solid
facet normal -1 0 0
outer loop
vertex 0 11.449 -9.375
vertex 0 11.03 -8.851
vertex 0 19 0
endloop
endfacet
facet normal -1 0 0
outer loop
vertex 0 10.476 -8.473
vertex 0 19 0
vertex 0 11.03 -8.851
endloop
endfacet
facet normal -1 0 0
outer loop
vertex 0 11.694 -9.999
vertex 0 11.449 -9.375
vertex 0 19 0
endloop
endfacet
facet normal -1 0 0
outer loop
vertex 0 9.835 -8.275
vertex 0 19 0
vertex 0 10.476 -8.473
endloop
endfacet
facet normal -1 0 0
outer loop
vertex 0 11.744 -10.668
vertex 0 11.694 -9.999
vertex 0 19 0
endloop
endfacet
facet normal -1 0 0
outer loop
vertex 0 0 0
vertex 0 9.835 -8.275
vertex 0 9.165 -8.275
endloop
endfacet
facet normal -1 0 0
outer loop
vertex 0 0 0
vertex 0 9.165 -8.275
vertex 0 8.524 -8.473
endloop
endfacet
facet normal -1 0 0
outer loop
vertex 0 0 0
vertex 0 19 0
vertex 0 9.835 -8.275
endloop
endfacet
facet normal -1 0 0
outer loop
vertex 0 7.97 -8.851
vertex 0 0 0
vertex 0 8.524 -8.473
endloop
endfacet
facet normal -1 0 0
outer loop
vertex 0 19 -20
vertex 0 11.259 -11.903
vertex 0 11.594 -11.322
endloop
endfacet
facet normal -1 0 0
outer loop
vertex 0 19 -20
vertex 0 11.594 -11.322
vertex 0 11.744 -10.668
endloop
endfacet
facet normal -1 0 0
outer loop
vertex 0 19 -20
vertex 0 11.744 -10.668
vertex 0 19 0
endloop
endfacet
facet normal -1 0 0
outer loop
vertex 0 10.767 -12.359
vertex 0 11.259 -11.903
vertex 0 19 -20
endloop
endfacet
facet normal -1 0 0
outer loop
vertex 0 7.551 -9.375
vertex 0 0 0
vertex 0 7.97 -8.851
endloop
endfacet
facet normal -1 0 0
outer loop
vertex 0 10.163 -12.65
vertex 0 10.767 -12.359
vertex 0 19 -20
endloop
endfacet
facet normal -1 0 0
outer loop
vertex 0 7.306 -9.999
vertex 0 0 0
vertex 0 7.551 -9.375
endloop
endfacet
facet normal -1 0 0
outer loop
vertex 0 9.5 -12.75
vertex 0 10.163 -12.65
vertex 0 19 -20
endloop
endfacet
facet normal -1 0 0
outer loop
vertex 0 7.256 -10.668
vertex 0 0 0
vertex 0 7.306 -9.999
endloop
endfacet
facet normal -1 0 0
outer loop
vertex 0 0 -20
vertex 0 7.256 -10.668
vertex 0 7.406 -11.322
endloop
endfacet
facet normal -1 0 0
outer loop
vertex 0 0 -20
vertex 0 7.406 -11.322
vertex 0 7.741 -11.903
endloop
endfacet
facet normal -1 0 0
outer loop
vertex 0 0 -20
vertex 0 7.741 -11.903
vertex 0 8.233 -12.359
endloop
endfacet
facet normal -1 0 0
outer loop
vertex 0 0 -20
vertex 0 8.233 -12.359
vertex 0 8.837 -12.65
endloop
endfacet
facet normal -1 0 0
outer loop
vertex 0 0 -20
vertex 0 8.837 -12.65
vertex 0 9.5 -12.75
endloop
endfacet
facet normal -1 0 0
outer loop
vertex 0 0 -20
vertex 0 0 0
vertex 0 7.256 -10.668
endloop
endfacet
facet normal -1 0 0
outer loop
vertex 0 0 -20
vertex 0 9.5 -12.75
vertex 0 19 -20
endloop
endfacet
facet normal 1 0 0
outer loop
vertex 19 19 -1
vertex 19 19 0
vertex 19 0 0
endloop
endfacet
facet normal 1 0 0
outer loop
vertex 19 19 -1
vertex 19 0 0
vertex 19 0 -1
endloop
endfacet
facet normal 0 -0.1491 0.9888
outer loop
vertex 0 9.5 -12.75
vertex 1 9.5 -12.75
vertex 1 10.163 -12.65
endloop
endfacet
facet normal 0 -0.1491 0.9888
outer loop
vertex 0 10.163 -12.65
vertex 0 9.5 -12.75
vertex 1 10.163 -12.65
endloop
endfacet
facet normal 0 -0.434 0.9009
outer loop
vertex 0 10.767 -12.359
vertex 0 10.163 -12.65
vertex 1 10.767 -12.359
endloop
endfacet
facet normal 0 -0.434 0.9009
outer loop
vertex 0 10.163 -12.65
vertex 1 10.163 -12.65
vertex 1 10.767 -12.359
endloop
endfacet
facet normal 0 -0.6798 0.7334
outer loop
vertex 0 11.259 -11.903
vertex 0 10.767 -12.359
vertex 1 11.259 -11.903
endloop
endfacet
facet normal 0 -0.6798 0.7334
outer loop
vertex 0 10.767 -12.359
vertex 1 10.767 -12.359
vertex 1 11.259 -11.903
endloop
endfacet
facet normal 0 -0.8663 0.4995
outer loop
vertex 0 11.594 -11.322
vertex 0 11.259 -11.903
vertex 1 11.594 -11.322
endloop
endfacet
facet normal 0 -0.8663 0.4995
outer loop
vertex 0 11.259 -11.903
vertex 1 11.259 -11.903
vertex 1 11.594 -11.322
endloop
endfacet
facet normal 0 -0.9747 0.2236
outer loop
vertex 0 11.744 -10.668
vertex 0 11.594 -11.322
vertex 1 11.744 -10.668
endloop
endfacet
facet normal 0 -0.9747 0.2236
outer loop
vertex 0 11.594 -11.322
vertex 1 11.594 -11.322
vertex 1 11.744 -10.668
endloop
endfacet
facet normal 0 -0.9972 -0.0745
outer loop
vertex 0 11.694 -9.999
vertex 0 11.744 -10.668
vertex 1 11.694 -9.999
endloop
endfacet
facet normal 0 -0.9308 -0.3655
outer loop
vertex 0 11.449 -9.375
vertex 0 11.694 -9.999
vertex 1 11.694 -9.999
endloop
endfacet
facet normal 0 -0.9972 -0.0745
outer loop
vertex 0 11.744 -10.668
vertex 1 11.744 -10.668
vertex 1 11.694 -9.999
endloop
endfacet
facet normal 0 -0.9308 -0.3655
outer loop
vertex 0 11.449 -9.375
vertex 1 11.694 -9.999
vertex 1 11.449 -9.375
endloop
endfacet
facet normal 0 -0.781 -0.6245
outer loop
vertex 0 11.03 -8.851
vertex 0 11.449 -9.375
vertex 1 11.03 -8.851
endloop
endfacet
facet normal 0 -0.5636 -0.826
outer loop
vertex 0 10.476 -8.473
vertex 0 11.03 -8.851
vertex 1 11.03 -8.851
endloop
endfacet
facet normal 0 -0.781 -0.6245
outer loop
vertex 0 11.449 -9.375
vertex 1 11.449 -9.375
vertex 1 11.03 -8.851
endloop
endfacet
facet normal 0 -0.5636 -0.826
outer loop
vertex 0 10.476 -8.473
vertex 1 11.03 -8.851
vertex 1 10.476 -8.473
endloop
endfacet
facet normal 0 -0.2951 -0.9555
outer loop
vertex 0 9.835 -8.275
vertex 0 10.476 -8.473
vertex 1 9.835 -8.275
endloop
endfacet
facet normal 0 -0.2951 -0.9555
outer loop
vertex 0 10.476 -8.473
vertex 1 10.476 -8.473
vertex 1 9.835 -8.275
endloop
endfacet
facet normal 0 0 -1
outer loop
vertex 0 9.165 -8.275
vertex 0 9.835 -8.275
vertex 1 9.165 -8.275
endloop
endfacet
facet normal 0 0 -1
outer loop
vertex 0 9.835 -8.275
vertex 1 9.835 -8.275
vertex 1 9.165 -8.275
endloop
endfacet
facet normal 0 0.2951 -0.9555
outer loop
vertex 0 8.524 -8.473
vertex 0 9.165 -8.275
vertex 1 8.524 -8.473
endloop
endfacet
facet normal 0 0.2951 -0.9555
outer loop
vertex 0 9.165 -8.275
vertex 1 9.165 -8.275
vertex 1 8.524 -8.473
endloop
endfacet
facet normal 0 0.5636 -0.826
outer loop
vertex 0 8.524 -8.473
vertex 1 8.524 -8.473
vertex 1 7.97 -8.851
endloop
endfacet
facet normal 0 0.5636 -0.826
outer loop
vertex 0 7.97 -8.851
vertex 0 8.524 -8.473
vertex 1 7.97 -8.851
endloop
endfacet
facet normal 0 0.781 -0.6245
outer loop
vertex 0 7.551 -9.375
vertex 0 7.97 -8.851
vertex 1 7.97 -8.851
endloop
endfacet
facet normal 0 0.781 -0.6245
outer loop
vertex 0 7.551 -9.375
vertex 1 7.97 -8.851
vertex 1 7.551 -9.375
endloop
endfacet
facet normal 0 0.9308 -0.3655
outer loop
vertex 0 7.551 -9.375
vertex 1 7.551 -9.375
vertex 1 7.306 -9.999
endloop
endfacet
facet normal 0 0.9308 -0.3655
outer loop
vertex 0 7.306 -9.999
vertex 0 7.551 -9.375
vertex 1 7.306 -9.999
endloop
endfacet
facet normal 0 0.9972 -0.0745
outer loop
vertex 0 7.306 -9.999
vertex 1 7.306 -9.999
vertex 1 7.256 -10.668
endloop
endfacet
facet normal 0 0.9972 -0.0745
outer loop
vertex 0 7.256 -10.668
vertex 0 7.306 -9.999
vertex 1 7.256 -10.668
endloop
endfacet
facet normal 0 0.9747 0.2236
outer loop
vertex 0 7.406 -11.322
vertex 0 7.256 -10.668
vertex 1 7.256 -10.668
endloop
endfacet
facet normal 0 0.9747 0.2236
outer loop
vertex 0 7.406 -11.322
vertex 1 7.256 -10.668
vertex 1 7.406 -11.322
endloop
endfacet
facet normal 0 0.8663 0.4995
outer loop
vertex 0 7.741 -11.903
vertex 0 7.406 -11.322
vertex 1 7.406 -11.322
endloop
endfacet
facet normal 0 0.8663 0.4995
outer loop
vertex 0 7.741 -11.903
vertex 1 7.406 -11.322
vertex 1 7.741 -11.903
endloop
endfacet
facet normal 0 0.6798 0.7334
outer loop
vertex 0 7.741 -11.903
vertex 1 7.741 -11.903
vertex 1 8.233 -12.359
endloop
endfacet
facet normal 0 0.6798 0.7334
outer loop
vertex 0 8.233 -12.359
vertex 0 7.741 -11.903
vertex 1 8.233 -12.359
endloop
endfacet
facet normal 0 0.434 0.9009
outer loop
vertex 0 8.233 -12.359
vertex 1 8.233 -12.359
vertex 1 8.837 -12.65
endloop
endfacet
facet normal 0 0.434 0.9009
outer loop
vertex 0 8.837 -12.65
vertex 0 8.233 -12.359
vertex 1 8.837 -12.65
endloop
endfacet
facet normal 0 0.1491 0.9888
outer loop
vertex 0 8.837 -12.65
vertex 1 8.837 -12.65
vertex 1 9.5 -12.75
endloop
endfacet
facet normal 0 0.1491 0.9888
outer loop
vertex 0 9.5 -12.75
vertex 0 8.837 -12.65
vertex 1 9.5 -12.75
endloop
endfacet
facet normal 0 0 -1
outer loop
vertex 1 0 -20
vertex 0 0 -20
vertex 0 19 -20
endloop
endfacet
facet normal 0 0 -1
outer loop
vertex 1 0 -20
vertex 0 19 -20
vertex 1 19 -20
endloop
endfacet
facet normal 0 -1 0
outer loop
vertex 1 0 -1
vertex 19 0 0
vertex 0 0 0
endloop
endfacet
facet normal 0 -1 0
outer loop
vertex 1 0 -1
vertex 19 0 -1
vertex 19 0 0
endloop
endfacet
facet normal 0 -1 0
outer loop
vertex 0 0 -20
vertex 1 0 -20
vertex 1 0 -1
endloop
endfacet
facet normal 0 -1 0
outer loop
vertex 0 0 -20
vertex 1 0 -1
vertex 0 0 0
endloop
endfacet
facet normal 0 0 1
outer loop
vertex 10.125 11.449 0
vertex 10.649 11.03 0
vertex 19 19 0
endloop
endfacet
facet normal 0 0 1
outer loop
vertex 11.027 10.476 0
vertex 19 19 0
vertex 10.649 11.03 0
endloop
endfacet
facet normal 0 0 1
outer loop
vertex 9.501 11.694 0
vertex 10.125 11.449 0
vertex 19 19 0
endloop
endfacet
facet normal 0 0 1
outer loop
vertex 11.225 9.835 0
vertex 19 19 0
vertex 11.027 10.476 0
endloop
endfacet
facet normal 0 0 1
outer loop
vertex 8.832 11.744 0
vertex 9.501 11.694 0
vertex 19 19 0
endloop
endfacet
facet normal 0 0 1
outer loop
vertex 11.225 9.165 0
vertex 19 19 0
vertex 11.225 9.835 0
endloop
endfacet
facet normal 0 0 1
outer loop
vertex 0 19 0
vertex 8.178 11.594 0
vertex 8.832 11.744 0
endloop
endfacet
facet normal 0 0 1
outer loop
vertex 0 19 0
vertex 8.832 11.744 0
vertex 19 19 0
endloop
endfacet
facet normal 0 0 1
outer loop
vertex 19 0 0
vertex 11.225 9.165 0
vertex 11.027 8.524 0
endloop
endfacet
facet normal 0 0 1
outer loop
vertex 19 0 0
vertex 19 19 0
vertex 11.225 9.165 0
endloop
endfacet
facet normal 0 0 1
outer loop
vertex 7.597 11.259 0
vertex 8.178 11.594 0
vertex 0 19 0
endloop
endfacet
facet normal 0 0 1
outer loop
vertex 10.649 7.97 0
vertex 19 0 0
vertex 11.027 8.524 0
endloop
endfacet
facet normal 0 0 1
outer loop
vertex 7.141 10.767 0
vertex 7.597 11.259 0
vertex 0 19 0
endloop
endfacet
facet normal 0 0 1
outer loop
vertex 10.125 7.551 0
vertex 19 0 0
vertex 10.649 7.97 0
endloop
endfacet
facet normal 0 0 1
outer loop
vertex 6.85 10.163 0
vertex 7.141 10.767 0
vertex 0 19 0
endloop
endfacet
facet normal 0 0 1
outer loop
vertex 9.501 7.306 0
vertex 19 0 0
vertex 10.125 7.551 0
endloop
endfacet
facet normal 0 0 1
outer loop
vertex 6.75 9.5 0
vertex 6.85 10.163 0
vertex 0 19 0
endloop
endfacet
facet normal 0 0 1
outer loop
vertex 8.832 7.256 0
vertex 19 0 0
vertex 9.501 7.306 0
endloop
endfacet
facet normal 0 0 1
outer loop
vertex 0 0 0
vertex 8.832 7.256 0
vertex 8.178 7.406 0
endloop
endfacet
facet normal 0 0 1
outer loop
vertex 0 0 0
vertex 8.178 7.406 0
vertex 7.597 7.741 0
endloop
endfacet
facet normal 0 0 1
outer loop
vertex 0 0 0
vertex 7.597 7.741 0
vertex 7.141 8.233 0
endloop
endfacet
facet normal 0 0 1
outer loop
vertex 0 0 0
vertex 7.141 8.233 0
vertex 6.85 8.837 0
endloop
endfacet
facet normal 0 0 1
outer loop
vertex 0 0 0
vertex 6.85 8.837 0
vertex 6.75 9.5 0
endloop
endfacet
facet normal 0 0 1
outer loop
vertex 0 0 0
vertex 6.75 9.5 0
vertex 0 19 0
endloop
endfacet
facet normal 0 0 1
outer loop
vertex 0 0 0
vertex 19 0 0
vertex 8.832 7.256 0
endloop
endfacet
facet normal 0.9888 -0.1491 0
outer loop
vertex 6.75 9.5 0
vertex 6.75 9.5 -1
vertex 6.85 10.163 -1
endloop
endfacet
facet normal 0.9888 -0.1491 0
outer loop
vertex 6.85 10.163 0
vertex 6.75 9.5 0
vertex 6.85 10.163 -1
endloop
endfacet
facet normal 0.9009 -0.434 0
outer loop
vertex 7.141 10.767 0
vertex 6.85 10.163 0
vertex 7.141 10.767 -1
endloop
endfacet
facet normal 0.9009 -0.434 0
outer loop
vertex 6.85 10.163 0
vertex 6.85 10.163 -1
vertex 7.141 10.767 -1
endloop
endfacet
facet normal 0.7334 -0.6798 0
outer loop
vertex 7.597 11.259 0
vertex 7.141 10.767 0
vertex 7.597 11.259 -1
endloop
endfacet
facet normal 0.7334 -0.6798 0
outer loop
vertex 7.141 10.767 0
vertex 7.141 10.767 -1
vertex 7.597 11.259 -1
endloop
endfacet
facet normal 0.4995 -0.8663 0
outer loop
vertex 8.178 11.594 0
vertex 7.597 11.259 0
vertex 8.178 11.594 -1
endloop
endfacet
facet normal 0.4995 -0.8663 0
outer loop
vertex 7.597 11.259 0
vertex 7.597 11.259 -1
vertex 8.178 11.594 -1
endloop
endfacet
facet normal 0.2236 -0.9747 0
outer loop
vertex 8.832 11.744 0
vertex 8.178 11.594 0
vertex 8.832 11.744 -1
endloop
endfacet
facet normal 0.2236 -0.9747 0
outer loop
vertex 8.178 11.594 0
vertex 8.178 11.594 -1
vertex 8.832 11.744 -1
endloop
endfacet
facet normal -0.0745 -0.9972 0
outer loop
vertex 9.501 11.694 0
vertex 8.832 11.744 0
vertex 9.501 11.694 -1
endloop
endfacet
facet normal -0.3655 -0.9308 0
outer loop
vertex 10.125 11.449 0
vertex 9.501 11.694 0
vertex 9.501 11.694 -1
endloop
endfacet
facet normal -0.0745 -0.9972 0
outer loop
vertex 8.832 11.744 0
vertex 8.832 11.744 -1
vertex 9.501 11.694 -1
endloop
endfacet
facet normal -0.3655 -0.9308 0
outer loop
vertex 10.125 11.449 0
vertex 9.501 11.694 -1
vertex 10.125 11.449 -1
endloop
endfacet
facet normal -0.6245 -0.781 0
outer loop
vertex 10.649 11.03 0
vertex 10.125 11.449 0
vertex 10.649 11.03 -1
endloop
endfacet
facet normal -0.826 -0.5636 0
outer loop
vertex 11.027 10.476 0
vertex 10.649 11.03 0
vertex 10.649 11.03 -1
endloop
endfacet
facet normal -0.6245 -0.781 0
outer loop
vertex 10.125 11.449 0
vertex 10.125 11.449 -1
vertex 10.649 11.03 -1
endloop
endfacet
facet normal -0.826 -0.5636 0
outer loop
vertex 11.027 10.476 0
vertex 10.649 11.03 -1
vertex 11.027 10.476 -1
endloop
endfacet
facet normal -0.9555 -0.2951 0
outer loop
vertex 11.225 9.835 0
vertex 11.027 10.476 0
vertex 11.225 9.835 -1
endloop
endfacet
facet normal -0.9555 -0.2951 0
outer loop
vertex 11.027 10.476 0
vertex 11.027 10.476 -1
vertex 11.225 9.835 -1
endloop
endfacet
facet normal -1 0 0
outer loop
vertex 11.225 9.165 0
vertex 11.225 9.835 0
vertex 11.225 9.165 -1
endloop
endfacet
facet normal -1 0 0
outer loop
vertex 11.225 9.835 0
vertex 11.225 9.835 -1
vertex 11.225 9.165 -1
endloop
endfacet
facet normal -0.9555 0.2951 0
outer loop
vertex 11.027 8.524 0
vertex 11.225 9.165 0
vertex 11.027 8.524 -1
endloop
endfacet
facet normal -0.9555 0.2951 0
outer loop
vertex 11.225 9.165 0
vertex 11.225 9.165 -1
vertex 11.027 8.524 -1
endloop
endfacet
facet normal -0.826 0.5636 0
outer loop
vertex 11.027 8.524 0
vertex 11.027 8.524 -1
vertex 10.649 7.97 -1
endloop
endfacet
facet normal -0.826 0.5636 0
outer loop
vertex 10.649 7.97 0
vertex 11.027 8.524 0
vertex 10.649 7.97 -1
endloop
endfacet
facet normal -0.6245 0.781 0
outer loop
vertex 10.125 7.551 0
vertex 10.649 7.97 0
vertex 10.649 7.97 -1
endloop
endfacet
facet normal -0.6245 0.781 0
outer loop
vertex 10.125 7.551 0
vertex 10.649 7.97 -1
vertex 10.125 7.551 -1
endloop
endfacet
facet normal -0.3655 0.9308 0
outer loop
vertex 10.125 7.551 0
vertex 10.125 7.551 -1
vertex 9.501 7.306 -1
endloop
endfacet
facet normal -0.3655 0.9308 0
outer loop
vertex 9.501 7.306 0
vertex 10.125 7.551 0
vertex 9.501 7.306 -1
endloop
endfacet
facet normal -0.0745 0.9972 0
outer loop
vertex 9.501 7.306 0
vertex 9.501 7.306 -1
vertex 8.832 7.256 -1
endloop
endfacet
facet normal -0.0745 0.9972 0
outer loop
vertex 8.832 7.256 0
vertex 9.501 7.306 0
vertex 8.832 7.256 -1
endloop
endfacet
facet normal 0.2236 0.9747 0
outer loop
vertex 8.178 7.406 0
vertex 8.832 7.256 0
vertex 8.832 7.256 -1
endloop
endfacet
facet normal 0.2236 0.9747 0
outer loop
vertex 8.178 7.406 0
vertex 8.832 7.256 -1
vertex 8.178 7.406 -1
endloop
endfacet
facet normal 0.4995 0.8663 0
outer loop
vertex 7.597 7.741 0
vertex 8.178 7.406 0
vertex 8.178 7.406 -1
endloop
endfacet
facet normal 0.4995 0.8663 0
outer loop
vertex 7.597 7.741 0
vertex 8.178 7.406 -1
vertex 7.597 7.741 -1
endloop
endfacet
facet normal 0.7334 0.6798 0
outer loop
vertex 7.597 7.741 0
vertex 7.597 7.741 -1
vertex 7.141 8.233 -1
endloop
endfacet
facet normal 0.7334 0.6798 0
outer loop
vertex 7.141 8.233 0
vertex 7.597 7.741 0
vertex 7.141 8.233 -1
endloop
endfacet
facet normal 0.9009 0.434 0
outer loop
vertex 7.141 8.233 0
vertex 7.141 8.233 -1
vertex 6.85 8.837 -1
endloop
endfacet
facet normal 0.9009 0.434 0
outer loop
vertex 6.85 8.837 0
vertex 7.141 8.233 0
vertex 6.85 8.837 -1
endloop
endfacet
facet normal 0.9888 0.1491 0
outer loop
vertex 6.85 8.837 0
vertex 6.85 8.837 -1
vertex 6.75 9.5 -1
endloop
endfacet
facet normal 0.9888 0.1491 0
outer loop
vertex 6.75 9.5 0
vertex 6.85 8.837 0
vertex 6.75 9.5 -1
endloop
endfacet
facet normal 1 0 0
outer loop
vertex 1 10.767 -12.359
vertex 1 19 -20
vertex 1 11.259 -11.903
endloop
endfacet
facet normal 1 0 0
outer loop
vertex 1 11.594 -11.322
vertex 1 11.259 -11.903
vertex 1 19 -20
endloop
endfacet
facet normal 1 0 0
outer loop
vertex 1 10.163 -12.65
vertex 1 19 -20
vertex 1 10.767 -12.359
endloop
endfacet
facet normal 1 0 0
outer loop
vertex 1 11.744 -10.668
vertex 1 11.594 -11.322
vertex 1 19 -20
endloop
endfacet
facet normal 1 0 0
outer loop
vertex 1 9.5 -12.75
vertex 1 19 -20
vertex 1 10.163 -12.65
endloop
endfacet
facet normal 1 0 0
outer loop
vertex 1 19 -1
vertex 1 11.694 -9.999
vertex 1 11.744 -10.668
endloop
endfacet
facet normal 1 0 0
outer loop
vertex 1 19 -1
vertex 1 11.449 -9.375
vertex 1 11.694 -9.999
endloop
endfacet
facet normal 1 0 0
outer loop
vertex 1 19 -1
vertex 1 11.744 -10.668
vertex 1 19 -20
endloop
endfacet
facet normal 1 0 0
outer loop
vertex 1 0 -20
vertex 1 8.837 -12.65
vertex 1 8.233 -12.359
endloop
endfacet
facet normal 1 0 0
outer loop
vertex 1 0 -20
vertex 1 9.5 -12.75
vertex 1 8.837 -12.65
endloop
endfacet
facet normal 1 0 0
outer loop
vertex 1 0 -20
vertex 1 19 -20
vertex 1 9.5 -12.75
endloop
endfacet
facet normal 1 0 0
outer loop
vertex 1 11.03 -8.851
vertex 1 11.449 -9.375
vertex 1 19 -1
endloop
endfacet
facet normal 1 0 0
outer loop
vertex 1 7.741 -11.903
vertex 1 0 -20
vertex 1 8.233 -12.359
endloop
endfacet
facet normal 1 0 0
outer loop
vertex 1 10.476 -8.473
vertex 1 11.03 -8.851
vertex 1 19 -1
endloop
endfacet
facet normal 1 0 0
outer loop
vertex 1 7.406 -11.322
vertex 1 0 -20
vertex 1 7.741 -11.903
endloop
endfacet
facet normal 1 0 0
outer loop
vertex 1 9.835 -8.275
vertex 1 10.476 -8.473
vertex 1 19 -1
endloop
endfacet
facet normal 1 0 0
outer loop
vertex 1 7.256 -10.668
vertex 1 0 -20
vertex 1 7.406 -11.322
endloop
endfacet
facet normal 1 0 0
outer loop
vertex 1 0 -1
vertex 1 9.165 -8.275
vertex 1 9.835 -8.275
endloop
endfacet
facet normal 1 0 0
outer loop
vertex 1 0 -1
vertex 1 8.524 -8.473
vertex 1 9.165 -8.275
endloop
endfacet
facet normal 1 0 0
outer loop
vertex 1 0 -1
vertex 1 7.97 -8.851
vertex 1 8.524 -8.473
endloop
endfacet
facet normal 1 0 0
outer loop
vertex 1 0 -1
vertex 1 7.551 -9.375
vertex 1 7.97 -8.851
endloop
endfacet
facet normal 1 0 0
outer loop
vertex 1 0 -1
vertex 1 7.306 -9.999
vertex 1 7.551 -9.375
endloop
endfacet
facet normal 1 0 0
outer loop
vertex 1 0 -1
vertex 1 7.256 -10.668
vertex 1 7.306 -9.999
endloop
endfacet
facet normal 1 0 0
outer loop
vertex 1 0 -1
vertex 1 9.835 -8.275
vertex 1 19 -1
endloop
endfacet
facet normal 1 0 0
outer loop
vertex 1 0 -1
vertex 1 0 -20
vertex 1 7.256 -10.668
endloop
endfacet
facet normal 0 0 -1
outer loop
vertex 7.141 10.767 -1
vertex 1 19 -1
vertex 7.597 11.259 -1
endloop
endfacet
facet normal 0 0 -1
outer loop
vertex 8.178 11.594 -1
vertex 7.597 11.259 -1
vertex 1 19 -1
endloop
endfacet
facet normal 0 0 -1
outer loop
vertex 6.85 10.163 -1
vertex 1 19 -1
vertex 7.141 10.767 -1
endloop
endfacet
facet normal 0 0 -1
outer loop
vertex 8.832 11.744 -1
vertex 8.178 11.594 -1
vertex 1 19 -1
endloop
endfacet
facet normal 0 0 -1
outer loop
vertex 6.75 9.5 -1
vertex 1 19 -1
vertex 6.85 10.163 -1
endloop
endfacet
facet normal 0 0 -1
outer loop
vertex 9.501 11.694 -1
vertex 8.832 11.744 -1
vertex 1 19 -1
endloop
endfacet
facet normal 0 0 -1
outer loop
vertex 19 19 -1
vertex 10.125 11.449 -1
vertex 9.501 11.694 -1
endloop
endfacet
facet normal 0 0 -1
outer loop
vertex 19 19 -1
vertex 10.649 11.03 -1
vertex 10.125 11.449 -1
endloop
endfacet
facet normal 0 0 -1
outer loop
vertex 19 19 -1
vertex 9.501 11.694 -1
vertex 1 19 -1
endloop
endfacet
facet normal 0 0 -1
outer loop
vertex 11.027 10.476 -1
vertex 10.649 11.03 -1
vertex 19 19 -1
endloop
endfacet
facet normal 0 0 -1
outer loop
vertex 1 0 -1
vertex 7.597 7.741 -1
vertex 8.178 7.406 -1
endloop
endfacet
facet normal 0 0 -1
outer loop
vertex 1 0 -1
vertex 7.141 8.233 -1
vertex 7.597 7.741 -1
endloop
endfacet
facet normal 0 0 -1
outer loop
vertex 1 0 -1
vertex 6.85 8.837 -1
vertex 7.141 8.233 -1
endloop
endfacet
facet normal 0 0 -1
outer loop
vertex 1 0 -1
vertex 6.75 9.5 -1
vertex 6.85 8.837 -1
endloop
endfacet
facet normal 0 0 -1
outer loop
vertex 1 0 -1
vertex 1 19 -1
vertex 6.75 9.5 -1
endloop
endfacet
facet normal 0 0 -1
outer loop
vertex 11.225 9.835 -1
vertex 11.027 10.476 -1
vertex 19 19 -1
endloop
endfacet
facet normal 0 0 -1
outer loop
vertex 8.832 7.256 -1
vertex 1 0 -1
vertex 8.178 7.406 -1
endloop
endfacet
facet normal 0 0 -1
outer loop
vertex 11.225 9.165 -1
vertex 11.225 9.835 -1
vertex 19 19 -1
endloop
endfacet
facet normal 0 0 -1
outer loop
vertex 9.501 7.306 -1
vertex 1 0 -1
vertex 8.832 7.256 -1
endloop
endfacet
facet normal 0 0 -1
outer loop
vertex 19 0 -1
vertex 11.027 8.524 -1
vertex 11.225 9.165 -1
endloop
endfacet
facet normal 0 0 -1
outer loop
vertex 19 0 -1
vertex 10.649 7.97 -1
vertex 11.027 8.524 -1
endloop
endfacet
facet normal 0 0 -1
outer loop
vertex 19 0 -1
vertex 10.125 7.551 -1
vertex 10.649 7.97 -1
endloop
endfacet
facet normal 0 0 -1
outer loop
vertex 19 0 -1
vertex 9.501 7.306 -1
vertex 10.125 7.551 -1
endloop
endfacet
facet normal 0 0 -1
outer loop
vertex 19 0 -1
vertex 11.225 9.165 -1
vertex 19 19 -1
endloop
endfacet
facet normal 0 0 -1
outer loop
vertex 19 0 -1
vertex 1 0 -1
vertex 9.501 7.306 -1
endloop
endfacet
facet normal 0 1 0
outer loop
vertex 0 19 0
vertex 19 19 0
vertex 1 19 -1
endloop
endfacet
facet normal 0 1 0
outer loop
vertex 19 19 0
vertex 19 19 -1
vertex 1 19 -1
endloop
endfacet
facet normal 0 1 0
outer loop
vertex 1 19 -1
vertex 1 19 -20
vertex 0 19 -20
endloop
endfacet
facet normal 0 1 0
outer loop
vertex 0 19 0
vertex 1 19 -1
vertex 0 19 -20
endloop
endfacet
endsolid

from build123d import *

# Parameters (mm, degrees)
EXTRUDE_1_DEPTH     = 19
SKETCH_3_W          = 1
SKETCH_3_H          = 19
CUT_EXTRUDE_1_DEPTH = 1
SKETCH_4_R          = 2.25
CUT_EXTRUDE_2_DEPTH = 2
SKETCH_5_R          = 2.25
CUT_EXTRUDE_3_DEPTH = 2


with BuildPart() as part:
    # Эскиз1 → Бобышка-Вытянуть1 (new body)
    with BuildSketch(Plane(origin=(0, 0, 0), x_dir=(1, 0, 0), z_dir=(0, 1, 0))):
        Polygon((0, 0), (0, 20), (1, 20), (1, 1), (20, 1), (20, 0), align=None)
    extrude(amount=EXTRUDE_1_DEPTH)

    # Эскиз3 → Вырез-Вытянуть1 (cut)
    with BuildSketch(Plane(origin=(20, 0, 0), x_dir=(0, 0, -1), z_dir=(1, 0, 0))):
        with Locations((0.5, 9.5)):
            Rectangle(SKETCH_3_W, SKETCH_3_H)
    extrude(amount=-CUT_EXTRUDE_1_DEPTH, mode=Mode.SUBTRACT)

    # Эскиз4 → Вырез-Вытянуть2 (cut, through all)
    with BuildSketch(Plane(origin=(1, 0, 0), x_dir=(0, 0, -1), z_dir=(1, 0, 0))):
        with Locations((10.5, 9.5)):
            Circle(SKETCH_4_R)
    extrude(amount=-CUT_EXTRUDE_2_DEPTH, mode=Mode.SUBTRACT)

    # Эскиз5 → Вырез-Вытянуть3 (cut, through all)
    with BuildSketch(Plane(origin=(0, 0, -1), x_dir=(-1, 0, 0), z_dir=(0, 0, -1))):
        with Locations((-9, 9.5)):
            Circle(SKETCH_5_R)
    extrude(amount=-CUT_EXTRUDE_3_DEPTH, mode=Mode.SUBTRACT)


solid = part.part
